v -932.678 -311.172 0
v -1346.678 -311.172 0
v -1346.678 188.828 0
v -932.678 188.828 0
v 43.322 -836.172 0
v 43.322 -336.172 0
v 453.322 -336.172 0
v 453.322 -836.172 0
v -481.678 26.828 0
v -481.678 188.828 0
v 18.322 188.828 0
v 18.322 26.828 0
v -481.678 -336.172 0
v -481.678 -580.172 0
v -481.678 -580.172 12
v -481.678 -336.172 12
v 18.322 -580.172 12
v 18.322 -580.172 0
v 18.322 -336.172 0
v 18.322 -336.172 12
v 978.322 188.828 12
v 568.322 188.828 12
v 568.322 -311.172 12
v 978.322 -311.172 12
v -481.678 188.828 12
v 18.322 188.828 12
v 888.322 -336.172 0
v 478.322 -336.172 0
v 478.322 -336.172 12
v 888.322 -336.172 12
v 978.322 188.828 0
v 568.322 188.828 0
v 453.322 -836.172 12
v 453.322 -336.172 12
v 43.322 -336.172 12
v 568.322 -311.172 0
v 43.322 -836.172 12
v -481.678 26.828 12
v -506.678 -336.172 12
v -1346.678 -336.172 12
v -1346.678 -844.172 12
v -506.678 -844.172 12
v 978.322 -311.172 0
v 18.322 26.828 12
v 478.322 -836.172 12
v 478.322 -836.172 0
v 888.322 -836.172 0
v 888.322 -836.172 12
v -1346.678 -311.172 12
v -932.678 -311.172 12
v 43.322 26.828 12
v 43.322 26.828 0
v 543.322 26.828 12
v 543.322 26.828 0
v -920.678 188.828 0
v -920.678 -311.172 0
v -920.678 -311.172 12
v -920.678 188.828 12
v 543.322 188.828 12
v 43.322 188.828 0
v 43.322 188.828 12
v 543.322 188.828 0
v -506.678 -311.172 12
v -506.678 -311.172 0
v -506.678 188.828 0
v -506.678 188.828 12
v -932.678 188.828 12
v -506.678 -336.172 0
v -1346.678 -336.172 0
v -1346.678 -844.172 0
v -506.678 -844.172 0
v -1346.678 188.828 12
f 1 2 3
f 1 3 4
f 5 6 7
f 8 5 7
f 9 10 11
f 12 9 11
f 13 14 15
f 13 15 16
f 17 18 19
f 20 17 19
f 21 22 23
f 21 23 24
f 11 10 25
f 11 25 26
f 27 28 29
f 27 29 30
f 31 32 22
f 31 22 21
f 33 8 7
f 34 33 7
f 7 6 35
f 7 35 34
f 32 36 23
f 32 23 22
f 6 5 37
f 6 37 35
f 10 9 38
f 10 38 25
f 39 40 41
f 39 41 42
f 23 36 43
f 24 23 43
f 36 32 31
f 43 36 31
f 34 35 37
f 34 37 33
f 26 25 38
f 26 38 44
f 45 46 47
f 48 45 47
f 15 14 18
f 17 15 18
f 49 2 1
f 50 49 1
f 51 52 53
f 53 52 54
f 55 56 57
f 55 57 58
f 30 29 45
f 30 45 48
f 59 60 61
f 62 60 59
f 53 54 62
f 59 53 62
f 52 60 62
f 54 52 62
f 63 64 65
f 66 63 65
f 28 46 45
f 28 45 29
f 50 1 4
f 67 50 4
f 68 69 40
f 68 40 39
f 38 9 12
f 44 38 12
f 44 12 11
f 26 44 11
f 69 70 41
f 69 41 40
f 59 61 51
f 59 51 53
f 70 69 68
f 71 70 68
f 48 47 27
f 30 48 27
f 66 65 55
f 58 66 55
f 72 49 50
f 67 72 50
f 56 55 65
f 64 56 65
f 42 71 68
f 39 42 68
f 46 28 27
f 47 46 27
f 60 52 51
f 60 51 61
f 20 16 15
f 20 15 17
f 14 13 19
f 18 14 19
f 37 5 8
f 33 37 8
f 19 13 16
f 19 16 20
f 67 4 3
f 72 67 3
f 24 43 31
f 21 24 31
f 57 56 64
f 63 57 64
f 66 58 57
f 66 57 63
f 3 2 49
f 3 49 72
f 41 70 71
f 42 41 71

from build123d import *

# Parameters (mm, degrees)
F0_W     = 12
F0_H     = 500
F0_W_2   = 402
F1_DEPTH = 12
F0_W_3   = 840
F0_H_2   = 508
F0_W_4   = 500
F0_H_3   = 162
F0_H_4   = 244
F0_W_5   = 410


# Not quite as in the source:
# - a feature names something its author has since deleted; it is built from what else it names


with BuildPart() as f1:
    # F0 (on Top) → F1 (new body)
    with BuildSketch(Plane.XY):
        with Locations((-1340.6781625152, -61.1715600074)):
            Rectangle(F0_W, F0_H)
        with Locations((-1133.6781625152, -61.1715600074)):
            Rectangle(F0_W_2, F0_H)
    extrude(amount=F1_DEPTH)


with BuildPart() as f1b:
    # F0 (on Top) → F1, piece 2 (new body)
    with BuildSketch(Plane.XY):
        with Locations((-719.6781625152, -61.1715600074)):
            Rectangle(F0_W_2, F0_H)
        with Locations((-512.6781625152, -61.1715600074)):
            Rectangle(F0_W, F0_H)
    extrude(amount=F1_DEPTH)


with BuildPart() as f1c:
    # F0 (on Top) → F1, piece 3 (new body)
    with BuildSketch(Plane.XY):
        with Locations((-926.6781625152, -590.1715600074)):
            Rectangle(F0_W_3, F0_H_2)
    extrude(amount=F1_DEPTH)


with BuildPart() as f1d:
    # F0 (on Top) → F1, piece 4 (new body)
    with BuildSketch(Plane.XY):
        with Locations((-231.6781625152, 107.8284399926)):
            Rectangle(F0_W_4, F0_H_3)
    extrude(amount=F1_DEPTH)


with BuildPart() as f1e:
    # F0 (on Top) → F1, piece 5 (new body)
    with BuildSketch(Plane.XY):
        with Locations((-231.6781625152, -458.1715600074)):
            Rectangle(F0_W_4, F0_H_4)
    extrude(amount=F1_DEPTH)


with BuildPart() as f1f:
    # F0 (on Top) → F1, piece 6 (new body)
    with BuildSketch(Plane.XY):
        with Locations((248.3218374848, -586.1715600074)):
            Rectangle(F0_W_5, F0_H)
    extrude(amount=F1_DEPTH)


with BuildPart() as f1g:
    # F0 (on Top) → F1, piece 7 (new body)
    with BuildSketch(Plane.XY):
        with Locations((293.3218374848, 107.8284399926)):
            Rectangle(F0_W_4, F0_H_3)
    extrude(amount=F1_DEPTH)


with BuildPart() as f1h:
    # F0 (on Top) → F1, piece 8 (new body)
    with BuildSketch(Plane.XY):
        with Locations((683.3218374848, -586.1715600074)):
            Rectangle(F0_W_5, F0_H)
    extrude(amount=F1_DEPTH)


with BuildPart() as f1i:
    # F0 (on Top) → F1, piece 9 (new body)
    with BuildSketch(Plane.XY):
        with Locations((773.3218374848, -61.1715600074)):
            Rectangle(F0_W_5, F0_H)
    extrude(amount=F1_DEPTH)


solid = Compound([f1.part, f1b.part, f1c.part, f1d.part, f1e.part, f1f.part, f1g.part, f1h.part, f1i.part])
